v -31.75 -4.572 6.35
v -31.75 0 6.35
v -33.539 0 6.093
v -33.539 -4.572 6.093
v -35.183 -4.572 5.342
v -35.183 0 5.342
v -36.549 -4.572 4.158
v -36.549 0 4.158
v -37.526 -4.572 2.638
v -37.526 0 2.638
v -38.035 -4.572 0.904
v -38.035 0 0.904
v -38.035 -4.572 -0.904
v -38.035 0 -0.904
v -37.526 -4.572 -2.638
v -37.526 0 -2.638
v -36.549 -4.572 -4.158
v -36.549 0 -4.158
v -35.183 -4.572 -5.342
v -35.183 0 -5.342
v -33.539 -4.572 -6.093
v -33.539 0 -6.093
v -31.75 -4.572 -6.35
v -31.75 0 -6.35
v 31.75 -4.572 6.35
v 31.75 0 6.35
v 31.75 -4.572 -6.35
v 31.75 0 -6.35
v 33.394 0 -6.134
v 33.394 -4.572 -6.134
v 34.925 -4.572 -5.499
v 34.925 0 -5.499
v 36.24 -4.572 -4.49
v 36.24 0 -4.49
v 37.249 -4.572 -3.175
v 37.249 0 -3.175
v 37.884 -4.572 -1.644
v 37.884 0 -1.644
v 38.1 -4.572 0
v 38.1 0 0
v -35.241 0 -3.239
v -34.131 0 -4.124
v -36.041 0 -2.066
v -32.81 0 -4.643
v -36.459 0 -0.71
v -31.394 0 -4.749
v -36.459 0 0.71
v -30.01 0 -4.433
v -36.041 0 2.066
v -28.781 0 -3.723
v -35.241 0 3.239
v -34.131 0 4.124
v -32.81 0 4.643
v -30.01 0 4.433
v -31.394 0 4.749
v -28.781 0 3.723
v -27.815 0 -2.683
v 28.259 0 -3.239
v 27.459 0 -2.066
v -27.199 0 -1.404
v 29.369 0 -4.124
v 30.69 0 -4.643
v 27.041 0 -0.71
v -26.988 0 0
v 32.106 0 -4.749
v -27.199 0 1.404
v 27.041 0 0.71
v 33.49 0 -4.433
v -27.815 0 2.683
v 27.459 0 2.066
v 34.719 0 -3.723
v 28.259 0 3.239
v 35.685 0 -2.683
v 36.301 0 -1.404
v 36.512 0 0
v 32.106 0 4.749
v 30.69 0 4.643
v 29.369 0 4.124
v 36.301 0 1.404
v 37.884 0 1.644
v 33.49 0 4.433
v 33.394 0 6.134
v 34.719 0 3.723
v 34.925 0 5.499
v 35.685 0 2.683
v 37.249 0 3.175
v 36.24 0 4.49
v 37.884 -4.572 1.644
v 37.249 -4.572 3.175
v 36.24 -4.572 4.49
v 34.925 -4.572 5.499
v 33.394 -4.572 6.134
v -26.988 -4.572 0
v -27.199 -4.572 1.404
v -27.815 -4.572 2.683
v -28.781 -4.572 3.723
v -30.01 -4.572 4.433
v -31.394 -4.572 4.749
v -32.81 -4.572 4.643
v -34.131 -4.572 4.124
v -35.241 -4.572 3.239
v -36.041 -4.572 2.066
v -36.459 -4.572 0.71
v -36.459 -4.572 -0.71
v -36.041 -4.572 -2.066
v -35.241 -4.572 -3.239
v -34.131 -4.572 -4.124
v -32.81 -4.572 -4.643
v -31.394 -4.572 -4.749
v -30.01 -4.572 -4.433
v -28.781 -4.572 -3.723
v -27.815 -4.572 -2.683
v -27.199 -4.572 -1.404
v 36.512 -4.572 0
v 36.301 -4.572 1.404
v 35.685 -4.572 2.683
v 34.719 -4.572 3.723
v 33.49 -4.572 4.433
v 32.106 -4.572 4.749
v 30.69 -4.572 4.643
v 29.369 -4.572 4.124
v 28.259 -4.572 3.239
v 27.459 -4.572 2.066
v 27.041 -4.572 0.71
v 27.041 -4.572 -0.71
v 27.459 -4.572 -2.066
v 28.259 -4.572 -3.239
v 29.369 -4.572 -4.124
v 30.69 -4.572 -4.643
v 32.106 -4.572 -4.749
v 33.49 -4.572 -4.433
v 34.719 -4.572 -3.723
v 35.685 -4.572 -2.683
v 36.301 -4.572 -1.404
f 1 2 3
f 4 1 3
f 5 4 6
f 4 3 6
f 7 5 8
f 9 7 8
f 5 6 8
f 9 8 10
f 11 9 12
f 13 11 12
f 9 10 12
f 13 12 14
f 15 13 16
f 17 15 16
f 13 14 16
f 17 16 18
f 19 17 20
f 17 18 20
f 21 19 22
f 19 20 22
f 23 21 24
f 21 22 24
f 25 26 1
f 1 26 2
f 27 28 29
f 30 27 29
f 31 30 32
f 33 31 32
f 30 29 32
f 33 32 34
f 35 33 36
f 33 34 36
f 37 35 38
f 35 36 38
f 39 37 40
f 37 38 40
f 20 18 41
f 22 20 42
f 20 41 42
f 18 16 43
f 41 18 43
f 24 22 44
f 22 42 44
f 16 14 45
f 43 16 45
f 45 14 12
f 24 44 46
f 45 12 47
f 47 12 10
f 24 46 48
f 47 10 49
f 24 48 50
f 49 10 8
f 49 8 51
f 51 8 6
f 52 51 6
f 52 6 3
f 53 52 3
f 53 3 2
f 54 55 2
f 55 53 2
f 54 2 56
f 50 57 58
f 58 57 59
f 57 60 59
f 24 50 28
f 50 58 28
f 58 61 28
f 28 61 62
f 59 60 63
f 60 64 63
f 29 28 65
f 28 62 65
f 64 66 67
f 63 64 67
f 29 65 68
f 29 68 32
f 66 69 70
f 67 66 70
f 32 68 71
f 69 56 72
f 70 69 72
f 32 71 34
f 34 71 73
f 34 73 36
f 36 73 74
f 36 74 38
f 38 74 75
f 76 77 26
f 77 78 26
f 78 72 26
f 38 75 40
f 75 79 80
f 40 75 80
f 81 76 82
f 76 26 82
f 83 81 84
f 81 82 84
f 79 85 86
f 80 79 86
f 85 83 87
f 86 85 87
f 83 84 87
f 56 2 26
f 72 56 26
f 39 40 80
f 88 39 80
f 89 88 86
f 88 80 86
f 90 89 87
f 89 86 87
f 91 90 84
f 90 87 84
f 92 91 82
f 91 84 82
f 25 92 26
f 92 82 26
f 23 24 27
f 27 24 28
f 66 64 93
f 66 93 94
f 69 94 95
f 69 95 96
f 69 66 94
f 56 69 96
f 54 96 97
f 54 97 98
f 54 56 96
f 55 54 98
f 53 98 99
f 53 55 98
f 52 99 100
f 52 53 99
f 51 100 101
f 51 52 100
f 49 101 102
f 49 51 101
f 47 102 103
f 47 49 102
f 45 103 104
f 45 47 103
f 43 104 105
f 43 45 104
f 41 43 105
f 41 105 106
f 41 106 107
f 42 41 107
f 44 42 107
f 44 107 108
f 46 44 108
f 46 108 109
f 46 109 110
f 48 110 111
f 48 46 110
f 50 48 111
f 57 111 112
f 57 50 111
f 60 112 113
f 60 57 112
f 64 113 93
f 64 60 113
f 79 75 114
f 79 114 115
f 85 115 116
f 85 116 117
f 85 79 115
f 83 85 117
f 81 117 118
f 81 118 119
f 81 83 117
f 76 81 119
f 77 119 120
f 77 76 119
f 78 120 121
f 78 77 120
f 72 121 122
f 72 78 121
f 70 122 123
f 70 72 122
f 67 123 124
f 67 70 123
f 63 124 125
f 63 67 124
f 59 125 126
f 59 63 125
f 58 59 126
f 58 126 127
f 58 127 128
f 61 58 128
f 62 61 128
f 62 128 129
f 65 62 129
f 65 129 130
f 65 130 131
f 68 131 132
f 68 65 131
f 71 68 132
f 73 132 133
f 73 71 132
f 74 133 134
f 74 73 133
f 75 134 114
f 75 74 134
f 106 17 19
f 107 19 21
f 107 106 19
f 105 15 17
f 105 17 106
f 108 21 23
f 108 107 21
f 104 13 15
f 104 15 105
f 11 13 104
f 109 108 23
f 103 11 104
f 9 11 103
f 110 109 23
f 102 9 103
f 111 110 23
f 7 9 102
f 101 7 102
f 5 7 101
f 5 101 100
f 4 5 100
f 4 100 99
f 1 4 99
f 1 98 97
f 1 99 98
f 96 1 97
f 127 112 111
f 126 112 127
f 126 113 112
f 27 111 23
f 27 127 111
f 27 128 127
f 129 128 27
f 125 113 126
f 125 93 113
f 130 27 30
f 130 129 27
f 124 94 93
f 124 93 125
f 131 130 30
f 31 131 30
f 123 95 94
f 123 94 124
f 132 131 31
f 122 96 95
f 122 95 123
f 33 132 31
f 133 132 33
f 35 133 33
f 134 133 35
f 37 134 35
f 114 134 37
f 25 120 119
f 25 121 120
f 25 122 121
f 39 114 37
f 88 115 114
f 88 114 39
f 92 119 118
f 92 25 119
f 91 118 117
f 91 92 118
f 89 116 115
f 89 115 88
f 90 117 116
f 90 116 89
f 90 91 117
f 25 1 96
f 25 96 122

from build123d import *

# Parameters (mm, degrees)
F0_R     = 4.7625
F1_DEPTH = 4.572


with BuildPart() as f1:
    # F0 (on Front) → F1 (new body)
    with BuildSketch(Plane.XZ):
        with BuildLine():
            ThreePointArc((-31.75, -6.35), (-27.259872, -4.490128), (-25.4, 0))
            ThreePointArc((-25.4, 0), (-27.259872, 4.490128), (-31.75, 6.35))
            ThreePointArc((-31.75, 6.35), (-38.1, 0), (-31.75, -6.35))
        make_face()
        with Locations((-31.75, 0)):
            Circle(F0_R, mode=Mode.SUBTRACT)
        with BuildLine():
            ThreePointArc((-31.75, 6.35), (-27.259872, 4.490128), (-25.4, 0))
            ThreePointArc((-25.4, 0), (-27.259872, -4.490128), (-31.75, -6.35))
            Line((-31.75, -6.35), (31.75, -6.35))
            ThreePointArc((31.75, -6.35), (25.4, 0), (31.75, 6.35))
            Line((31.75, 6.35), (-31.75, 6.35))
        make_face()
        with BuildLine():
            ThreePointArc((38.1, 0), (36.240128, 4.490128), (31.75, 6.35))
            ThreePointArc((31.75, 6.35), (25.4, 0), (31.75, -6.35))
            ThreePointArc((31.75, -6.35), (36.240128, -4.490128), (38.1, 0))
        make_face()
        with Locations((31.75, 0)):
            Circle(F0_R, mode=Mode.SUBTRACT)
    extrude(amount=F1_DEPTH)


solid = f1.part
